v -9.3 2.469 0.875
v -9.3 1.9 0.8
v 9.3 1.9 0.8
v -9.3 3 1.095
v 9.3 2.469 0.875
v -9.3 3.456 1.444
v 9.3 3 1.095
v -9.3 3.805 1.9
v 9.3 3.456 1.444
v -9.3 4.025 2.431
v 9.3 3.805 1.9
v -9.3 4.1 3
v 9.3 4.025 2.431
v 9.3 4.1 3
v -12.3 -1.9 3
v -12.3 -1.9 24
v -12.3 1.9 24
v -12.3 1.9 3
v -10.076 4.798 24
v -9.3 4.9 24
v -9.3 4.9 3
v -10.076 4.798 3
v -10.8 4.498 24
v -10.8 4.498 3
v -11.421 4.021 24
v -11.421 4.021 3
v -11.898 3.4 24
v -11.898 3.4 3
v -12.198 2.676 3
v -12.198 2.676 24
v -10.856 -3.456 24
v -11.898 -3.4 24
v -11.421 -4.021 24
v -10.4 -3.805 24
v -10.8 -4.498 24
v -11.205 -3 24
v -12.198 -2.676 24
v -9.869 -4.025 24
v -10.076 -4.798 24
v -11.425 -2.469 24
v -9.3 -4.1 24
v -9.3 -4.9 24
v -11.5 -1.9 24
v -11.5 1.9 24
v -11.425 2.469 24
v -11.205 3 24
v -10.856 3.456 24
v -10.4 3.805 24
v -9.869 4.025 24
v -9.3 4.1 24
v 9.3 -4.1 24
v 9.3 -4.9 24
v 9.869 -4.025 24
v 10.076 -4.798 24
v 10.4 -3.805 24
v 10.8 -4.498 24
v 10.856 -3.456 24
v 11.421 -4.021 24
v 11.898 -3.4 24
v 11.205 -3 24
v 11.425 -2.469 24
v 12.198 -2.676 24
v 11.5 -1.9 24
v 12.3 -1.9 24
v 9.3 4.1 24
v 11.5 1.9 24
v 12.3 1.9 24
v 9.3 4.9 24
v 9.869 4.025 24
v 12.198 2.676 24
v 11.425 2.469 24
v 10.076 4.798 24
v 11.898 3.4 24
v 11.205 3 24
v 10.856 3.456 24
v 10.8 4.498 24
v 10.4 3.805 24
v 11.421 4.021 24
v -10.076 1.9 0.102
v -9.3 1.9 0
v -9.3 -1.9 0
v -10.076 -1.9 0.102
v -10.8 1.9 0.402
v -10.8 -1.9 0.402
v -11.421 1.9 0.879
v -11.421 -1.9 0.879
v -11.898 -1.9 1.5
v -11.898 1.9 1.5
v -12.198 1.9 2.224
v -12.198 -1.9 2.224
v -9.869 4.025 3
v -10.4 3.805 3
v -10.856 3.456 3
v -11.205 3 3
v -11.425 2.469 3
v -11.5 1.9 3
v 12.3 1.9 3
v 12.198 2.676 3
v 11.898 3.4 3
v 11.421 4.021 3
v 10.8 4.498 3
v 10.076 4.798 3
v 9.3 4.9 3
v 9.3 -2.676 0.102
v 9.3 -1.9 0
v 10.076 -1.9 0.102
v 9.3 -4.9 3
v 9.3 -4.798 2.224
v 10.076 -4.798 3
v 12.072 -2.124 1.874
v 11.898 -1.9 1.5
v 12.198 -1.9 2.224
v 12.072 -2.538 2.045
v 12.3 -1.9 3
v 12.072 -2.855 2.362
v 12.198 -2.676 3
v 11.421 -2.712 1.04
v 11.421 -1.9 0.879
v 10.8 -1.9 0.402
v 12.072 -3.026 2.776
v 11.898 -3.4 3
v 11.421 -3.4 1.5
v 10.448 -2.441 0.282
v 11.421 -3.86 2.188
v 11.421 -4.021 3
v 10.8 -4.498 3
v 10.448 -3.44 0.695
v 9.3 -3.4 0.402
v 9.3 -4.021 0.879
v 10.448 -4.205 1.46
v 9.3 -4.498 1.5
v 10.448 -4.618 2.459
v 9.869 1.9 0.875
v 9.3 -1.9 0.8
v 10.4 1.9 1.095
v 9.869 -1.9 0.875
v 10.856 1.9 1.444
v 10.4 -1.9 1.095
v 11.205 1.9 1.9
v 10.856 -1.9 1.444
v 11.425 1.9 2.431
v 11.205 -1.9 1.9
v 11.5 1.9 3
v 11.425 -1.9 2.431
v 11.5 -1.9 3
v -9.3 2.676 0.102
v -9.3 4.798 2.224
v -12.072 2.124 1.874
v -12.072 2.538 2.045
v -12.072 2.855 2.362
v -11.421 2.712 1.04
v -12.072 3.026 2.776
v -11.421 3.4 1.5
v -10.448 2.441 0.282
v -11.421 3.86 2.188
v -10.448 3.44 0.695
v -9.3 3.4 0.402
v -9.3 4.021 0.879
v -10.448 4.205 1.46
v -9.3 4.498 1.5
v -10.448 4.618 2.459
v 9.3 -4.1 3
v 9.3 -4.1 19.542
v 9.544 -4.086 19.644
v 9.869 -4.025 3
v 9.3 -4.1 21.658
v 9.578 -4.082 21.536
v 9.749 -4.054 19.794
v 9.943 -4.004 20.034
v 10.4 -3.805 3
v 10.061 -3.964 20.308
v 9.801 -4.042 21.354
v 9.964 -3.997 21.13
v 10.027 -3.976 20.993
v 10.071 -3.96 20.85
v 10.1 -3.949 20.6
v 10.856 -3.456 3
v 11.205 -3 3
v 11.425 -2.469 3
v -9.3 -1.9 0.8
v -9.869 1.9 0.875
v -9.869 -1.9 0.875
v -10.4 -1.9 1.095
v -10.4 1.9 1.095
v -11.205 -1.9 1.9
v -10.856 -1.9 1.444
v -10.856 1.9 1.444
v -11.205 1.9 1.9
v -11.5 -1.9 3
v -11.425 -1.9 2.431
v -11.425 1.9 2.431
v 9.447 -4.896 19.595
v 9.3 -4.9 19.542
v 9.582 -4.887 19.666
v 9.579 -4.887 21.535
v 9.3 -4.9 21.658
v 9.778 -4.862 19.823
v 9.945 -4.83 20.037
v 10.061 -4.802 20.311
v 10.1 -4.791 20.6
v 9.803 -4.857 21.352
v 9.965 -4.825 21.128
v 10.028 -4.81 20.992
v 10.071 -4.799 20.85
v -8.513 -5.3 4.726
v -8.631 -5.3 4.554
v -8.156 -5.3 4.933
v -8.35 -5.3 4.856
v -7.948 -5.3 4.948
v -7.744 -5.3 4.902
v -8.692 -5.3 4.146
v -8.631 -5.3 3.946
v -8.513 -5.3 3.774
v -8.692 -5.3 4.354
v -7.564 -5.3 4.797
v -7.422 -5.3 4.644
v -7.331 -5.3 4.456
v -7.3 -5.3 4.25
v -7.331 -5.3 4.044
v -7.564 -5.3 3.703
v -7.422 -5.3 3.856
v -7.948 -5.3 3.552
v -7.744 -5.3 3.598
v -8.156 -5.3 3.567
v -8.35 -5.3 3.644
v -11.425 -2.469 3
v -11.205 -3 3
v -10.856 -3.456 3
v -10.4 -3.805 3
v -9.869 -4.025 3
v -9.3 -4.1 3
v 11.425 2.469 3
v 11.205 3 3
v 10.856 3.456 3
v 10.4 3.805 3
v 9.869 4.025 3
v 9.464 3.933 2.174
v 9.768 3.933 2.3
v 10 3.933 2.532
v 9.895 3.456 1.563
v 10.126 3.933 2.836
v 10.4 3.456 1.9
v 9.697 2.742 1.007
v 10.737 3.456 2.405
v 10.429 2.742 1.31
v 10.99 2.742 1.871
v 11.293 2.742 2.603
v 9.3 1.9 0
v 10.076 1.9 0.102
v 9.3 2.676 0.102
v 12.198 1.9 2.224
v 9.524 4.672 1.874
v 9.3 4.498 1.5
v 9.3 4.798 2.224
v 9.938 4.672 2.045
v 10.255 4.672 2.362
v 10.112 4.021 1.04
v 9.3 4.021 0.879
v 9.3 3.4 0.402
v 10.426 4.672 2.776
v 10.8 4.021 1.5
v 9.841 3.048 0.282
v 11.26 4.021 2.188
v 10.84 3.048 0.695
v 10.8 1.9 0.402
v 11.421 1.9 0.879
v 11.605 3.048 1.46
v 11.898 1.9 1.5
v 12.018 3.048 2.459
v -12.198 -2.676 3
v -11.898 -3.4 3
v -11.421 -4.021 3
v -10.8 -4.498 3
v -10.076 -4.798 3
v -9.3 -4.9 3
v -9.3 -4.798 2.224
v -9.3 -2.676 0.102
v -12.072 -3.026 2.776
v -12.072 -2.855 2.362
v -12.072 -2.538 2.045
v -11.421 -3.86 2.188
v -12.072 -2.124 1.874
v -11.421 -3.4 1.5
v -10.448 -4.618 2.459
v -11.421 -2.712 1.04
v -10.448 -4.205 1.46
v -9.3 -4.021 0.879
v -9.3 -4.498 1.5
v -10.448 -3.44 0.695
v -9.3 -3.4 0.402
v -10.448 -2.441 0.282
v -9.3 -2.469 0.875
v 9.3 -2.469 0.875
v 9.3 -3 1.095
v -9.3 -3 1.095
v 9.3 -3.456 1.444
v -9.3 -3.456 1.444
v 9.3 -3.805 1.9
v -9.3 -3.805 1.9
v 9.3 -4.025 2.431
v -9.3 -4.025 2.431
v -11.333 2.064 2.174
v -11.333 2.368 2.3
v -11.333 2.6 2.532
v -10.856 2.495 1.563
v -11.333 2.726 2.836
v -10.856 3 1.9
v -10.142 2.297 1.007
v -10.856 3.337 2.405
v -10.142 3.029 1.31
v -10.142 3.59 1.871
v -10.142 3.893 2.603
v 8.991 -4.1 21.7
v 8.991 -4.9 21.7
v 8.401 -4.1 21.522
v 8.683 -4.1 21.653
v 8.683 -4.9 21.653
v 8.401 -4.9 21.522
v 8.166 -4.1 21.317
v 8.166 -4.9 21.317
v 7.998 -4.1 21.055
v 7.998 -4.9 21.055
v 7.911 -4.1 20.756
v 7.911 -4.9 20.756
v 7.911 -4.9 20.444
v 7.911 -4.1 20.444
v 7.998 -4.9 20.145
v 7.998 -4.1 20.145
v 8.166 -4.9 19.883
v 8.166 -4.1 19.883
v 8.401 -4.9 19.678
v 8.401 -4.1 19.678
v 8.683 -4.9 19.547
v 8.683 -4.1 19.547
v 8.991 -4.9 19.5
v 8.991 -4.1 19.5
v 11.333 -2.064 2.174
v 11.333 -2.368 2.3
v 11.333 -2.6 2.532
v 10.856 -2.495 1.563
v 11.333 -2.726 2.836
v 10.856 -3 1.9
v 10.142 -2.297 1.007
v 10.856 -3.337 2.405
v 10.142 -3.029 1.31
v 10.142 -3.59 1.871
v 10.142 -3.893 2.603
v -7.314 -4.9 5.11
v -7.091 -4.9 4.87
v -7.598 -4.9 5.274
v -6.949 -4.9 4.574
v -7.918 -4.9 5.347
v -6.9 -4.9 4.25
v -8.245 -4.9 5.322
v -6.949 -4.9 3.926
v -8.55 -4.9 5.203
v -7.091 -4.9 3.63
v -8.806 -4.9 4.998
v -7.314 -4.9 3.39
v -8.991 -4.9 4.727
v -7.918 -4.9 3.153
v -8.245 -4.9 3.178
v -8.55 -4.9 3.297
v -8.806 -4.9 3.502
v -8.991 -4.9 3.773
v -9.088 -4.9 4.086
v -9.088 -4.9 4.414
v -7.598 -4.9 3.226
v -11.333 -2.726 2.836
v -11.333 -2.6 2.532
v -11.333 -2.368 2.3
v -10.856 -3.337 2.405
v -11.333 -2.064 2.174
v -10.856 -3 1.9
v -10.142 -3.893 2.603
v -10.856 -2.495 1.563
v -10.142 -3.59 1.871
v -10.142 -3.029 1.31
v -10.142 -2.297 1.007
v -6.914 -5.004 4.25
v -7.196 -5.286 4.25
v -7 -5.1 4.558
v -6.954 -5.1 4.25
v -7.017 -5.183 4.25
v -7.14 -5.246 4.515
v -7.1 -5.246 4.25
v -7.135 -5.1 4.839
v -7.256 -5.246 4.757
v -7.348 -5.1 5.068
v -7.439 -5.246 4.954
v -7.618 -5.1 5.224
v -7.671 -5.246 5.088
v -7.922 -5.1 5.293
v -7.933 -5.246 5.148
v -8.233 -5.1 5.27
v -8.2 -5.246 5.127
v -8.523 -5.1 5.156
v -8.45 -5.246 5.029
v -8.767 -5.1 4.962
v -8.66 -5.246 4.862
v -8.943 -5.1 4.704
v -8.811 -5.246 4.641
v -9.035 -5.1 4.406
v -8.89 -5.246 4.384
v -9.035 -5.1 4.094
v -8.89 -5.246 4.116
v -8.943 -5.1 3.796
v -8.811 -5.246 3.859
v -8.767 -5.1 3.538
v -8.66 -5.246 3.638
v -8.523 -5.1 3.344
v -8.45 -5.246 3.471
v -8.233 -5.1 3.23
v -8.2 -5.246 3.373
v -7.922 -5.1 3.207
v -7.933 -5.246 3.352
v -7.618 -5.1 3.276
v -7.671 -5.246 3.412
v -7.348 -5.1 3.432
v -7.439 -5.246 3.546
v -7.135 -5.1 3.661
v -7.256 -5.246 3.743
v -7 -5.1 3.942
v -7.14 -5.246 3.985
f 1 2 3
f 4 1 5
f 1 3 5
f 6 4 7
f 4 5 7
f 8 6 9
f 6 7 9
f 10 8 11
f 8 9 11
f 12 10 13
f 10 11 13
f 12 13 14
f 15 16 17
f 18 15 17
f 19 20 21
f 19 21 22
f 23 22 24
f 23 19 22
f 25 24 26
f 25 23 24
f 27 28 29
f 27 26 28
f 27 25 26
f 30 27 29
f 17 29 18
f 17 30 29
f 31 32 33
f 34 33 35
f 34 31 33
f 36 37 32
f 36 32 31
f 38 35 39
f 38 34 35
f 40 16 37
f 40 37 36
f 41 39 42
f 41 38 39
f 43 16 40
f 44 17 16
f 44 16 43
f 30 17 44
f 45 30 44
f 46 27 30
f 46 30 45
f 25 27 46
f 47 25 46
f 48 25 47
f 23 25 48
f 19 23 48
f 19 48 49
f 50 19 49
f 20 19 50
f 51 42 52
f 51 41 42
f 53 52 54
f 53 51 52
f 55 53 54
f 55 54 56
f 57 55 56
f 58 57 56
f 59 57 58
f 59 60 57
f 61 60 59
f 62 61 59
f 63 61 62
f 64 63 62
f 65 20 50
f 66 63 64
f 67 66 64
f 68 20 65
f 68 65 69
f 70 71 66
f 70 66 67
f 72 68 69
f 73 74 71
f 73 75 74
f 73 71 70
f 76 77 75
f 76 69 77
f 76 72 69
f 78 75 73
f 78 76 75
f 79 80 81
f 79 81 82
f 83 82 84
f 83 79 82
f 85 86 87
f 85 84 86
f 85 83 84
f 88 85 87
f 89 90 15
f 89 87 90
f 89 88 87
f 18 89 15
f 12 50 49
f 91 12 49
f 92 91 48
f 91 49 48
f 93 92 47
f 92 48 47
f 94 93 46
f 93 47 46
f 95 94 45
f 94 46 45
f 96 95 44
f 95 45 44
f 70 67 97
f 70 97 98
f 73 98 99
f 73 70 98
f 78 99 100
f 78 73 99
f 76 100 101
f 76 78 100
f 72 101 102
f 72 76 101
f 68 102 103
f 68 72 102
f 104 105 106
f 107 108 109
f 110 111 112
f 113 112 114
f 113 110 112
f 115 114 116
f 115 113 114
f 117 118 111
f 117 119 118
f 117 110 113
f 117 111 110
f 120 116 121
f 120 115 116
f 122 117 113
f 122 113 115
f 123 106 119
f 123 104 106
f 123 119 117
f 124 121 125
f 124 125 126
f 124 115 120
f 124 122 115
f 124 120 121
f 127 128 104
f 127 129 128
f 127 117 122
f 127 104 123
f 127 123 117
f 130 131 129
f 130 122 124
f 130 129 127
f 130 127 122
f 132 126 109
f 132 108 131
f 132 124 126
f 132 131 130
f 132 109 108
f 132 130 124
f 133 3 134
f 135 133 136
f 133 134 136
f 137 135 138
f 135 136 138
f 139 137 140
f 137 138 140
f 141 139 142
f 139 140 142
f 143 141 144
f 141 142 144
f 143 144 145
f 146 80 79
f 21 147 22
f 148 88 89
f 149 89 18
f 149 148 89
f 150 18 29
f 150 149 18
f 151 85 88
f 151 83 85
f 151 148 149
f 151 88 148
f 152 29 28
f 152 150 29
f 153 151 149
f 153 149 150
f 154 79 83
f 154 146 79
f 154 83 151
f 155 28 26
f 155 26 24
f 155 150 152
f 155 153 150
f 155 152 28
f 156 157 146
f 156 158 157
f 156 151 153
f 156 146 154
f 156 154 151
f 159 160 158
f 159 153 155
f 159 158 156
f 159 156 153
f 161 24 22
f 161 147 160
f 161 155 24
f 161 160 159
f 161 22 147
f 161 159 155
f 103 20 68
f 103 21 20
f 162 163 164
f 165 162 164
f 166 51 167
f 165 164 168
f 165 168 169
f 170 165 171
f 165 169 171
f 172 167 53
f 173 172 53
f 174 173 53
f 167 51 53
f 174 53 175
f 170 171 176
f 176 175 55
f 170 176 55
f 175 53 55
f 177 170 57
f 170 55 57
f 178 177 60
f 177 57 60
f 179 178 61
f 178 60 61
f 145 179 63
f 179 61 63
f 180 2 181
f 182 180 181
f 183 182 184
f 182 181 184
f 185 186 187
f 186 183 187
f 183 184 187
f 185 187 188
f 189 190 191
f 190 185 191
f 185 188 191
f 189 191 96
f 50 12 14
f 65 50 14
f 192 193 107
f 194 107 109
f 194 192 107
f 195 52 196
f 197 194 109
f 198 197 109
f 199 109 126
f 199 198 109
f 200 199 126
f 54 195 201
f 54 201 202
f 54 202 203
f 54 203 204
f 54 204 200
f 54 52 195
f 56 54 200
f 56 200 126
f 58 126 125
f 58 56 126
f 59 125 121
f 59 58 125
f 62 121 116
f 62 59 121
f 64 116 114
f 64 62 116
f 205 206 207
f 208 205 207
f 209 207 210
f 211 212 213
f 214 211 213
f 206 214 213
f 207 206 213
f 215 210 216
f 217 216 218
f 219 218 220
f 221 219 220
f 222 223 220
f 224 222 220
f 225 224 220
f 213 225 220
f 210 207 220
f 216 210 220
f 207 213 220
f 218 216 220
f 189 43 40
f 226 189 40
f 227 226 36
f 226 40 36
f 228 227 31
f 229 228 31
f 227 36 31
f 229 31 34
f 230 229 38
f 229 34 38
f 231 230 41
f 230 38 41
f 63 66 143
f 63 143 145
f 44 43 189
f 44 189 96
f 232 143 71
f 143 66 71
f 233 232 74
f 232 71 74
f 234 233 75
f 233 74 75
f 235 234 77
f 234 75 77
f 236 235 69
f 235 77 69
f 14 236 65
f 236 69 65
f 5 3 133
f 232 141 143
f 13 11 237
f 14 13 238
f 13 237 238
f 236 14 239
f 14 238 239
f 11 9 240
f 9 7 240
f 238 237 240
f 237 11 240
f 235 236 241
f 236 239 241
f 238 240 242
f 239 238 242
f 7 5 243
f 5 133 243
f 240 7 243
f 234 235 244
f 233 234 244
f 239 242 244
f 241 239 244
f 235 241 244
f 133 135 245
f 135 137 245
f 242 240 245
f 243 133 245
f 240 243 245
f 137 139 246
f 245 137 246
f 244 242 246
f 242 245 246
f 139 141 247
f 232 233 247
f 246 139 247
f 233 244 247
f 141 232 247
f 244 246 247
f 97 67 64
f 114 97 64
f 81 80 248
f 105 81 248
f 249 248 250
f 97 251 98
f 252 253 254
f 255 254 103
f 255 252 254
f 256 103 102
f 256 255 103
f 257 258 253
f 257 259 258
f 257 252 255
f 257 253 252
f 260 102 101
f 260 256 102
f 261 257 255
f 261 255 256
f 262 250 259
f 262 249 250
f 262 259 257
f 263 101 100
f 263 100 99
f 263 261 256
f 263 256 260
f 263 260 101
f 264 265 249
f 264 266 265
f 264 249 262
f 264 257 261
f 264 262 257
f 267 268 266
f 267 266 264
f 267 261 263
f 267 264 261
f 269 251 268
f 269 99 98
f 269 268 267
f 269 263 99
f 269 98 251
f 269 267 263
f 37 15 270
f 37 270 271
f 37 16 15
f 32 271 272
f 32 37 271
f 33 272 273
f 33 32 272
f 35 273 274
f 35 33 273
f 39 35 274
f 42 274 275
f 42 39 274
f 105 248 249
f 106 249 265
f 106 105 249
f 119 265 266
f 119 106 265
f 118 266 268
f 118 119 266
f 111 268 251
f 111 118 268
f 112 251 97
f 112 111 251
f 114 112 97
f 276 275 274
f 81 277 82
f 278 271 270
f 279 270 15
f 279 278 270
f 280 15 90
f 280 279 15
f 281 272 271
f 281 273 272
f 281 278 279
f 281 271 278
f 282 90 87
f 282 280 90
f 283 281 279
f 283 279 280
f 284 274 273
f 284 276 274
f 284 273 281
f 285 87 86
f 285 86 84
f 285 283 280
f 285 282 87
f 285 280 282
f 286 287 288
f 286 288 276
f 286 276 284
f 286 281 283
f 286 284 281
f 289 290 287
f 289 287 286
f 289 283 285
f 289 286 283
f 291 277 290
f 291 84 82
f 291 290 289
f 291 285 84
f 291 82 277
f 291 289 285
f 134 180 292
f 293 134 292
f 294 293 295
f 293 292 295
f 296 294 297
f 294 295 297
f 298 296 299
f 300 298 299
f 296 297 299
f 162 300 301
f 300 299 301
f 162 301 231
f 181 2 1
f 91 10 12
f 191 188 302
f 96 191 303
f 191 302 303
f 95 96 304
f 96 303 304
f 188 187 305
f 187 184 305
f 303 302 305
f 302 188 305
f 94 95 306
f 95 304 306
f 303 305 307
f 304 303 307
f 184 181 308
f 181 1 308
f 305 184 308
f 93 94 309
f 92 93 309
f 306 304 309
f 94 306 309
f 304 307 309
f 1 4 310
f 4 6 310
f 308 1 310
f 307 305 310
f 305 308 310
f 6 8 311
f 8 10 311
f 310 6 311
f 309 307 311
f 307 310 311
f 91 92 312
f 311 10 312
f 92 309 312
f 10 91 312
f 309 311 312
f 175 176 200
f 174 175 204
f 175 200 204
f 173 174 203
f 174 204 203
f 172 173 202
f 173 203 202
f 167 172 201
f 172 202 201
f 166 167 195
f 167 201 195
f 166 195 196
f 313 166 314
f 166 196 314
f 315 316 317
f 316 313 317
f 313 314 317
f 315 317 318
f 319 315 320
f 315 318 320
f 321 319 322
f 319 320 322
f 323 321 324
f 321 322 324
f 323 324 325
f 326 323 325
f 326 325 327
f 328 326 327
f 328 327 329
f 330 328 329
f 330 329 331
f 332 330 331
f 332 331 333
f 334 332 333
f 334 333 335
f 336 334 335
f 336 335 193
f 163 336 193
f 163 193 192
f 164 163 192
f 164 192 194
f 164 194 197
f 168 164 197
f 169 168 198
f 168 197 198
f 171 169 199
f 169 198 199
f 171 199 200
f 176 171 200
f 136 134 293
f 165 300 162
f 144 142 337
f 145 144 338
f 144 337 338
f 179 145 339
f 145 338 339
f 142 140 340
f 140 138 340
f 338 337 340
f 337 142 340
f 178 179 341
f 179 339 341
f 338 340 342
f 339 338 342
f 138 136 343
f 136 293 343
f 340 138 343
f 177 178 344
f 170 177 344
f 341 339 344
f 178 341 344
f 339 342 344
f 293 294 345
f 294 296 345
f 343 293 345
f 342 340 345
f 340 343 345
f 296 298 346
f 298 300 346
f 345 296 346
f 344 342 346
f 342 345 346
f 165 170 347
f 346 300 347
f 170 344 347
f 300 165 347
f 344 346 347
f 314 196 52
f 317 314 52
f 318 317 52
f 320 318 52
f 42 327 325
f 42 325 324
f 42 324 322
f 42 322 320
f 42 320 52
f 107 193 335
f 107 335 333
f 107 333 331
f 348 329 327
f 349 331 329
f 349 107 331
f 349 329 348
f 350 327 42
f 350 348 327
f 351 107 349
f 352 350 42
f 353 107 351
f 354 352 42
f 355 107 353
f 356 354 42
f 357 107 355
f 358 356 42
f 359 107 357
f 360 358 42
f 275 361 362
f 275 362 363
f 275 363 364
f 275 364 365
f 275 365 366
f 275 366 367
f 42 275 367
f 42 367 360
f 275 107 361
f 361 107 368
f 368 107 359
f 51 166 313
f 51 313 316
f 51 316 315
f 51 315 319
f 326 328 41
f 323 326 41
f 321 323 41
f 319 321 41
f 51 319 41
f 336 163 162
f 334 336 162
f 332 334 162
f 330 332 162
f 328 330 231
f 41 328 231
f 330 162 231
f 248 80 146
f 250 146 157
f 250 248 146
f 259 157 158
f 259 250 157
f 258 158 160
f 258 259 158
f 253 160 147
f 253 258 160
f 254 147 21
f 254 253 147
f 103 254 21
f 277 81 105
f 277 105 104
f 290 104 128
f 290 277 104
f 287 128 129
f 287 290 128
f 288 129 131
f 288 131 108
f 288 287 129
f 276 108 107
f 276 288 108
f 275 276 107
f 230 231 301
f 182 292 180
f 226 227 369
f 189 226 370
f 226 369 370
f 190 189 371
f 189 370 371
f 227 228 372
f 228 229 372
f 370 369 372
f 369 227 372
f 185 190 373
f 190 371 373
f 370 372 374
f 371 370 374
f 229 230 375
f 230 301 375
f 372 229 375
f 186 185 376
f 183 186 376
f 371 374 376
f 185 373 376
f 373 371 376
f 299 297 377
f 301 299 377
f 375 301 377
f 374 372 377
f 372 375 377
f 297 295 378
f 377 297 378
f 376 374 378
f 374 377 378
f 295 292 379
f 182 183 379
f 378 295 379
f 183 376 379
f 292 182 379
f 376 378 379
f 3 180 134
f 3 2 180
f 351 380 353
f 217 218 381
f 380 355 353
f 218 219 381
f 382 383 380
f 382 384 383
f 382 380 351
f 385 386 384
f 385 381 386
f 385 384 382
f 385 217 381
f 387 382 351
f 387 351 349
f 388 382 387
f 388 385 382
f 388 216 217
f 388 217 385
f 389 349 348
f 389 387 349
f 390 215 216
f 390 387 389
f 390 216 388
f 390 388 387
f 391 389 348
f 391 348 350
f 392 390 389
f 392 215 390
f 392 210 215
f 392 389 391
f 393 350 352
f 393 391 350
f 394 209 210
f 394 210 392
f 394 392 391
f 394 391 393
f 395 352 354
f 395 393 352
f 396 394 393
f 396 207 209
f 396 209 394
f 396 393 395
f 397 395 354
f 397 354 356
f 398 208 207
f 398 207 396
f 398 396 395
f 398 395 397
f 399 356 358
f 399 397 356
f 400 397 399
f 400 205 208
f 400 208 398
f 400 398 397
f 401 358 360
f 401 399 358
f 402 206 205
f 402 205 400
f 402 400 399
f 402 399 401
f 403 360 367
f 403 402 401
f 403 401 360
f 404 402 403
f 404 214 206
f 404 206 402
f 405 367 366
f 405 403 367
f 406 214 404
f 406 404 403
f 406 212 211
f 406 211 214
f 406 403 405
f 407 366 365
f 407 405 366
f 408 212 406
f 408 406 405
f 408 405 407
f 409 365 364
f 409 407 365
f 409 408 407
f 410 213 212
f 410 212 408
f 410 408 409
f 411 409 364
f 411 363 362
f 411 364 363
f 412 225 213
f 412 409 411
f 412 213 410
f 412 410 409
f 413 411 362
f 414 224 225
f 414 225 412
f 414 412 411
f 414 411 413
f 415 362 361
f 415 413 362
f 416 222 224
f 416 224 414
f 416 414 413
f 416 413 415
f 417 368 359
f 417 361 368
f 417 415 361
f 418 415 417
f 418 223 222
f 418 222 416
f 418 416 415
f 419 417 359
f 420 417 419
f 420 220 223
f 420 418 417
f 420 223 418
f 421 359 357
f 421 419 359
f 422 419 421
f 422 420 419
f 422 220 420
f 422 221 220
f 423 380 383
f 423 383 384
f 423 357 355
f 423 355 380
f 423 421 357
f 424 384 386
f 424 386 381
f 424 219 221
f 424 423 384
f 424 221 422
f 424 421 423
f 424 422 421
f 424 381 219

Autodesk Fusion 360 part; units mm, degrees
sketch "スケッチ1" plane through (0, 0, 0) normal (0, 0, 1) x (1, 0, 0)
  line L0 (12.3, -4.9) -> (-12.3, -4.9)
  line L1 (-12.3, -4.9) -> (-12.3, 4.9)
  line L2 (-12.3, 4.9) -> (12.3, 4.9)
  line L3 (12.3, 4.9) -> (12.3, -4.9)
  line L4 (12.3, -4.9) -> (-12.3, 4.9) construction
  line L5 (-12.3, -4.9) -> (12.3, 4.9) construction
  dimension "d1" = 24.6
  dimension "d2" = 9.8
extrude "押し出し1" add sketch "スケッチ1" along normal blind 24
fillet "フィレット2" radius 3 8 edges at (0, -4.9, 0) (12.3, 0, 0) (0, 4.9, 0) (-12.3, 0, 0) (12.3, -4.9, 12) (-12.3, -4.9, 12) (-12.3, 4.9, 12) (12.3, 4.9, 12)
shell "シェル2" thickness 0.8 removed faces 1 at (3.1, -1.6333, 24)
ref_plane "作業平面3" through (0, -4.9, 0) normal (0, 1, 0) x (0, 0, 1)
sketch "スケッチ2" plane through (0, -4.9, 0) normal (0, 1, 0) x (1, 0, 0)
  circle A0 centre (9, -20.6) radius 1.1
  line L0 (8.5, -0.6) -> (-8.5, -0.6)
  line L1 (-11.5, -3.6) -> (-11.5, -19.6)
  line L2 (-7.5, -23.6) -> (9, -23.6)
  line L3 (11.5, -21.1) -> (11.5, -3.6)
  line L4 (11.5, -0.6) -> (-11.5, -23.6) construction
  line L5 (-11.5, -0.6) -> (11.5, -23.6) construction
  arc A1 (-11.5, -19.6) -> (-7.5, -23.6) centre (-7.5, -19.6) ccw
  arc A2 (9, -23.6) -> (11.5, -21.1) centre (9, -21.1) ccw
  circle A3 centre (9, -21.1) radius 1.1
  arc A4 (11.5, -3.6) -> (8.5, -0.6) centre (8.5, -3.6) ccw
  arc A5 (-8.5, -0.6) -> (-11.5, -3.6) centre (-8.5, -3.6) ccw
  circle A6 centre (8, -12.1) radius 1.1
  circle A7 centre (8, -4.25) radius 1.1
  circle A8 centre (-8, -12.1) radius 1.1
  circle A9 centre (-8, -4.25) radius 1.1
  circle A10 centre (-8, -19.95) radius 1.1
  point P0 (0, -12.1)
  dimension "d19" = 2.2
  dimension "d22" = 23
  dimension "d23" = 23
  dimension "d24" = 4
  dimension "d25" = 2.5
  dimension "d26" = 2.2
  dimension "d27" = 3
  dimension "d28" = 3
  dimension "d30" = 2.2
  dimension "d31" = 2.2
  dimension "d32" = 2.2
  dimension "d33" = 2.2
  dimension "d34" = 2.2
extrude "押し出し3" cut sketch "スケッチ2" along normal blind 1.5 contours A0 A3 | A0 A3 picked at (9.093, -19.8394) picked at (9.0545, -21.1293)
extrude "押し出し4" add sketch "スケッチ2" against normal blind 0.4 contours A9
fillet "フィレット3" radius 0.4 1 edges at (-9.0256, -5.3, 3.8522)
